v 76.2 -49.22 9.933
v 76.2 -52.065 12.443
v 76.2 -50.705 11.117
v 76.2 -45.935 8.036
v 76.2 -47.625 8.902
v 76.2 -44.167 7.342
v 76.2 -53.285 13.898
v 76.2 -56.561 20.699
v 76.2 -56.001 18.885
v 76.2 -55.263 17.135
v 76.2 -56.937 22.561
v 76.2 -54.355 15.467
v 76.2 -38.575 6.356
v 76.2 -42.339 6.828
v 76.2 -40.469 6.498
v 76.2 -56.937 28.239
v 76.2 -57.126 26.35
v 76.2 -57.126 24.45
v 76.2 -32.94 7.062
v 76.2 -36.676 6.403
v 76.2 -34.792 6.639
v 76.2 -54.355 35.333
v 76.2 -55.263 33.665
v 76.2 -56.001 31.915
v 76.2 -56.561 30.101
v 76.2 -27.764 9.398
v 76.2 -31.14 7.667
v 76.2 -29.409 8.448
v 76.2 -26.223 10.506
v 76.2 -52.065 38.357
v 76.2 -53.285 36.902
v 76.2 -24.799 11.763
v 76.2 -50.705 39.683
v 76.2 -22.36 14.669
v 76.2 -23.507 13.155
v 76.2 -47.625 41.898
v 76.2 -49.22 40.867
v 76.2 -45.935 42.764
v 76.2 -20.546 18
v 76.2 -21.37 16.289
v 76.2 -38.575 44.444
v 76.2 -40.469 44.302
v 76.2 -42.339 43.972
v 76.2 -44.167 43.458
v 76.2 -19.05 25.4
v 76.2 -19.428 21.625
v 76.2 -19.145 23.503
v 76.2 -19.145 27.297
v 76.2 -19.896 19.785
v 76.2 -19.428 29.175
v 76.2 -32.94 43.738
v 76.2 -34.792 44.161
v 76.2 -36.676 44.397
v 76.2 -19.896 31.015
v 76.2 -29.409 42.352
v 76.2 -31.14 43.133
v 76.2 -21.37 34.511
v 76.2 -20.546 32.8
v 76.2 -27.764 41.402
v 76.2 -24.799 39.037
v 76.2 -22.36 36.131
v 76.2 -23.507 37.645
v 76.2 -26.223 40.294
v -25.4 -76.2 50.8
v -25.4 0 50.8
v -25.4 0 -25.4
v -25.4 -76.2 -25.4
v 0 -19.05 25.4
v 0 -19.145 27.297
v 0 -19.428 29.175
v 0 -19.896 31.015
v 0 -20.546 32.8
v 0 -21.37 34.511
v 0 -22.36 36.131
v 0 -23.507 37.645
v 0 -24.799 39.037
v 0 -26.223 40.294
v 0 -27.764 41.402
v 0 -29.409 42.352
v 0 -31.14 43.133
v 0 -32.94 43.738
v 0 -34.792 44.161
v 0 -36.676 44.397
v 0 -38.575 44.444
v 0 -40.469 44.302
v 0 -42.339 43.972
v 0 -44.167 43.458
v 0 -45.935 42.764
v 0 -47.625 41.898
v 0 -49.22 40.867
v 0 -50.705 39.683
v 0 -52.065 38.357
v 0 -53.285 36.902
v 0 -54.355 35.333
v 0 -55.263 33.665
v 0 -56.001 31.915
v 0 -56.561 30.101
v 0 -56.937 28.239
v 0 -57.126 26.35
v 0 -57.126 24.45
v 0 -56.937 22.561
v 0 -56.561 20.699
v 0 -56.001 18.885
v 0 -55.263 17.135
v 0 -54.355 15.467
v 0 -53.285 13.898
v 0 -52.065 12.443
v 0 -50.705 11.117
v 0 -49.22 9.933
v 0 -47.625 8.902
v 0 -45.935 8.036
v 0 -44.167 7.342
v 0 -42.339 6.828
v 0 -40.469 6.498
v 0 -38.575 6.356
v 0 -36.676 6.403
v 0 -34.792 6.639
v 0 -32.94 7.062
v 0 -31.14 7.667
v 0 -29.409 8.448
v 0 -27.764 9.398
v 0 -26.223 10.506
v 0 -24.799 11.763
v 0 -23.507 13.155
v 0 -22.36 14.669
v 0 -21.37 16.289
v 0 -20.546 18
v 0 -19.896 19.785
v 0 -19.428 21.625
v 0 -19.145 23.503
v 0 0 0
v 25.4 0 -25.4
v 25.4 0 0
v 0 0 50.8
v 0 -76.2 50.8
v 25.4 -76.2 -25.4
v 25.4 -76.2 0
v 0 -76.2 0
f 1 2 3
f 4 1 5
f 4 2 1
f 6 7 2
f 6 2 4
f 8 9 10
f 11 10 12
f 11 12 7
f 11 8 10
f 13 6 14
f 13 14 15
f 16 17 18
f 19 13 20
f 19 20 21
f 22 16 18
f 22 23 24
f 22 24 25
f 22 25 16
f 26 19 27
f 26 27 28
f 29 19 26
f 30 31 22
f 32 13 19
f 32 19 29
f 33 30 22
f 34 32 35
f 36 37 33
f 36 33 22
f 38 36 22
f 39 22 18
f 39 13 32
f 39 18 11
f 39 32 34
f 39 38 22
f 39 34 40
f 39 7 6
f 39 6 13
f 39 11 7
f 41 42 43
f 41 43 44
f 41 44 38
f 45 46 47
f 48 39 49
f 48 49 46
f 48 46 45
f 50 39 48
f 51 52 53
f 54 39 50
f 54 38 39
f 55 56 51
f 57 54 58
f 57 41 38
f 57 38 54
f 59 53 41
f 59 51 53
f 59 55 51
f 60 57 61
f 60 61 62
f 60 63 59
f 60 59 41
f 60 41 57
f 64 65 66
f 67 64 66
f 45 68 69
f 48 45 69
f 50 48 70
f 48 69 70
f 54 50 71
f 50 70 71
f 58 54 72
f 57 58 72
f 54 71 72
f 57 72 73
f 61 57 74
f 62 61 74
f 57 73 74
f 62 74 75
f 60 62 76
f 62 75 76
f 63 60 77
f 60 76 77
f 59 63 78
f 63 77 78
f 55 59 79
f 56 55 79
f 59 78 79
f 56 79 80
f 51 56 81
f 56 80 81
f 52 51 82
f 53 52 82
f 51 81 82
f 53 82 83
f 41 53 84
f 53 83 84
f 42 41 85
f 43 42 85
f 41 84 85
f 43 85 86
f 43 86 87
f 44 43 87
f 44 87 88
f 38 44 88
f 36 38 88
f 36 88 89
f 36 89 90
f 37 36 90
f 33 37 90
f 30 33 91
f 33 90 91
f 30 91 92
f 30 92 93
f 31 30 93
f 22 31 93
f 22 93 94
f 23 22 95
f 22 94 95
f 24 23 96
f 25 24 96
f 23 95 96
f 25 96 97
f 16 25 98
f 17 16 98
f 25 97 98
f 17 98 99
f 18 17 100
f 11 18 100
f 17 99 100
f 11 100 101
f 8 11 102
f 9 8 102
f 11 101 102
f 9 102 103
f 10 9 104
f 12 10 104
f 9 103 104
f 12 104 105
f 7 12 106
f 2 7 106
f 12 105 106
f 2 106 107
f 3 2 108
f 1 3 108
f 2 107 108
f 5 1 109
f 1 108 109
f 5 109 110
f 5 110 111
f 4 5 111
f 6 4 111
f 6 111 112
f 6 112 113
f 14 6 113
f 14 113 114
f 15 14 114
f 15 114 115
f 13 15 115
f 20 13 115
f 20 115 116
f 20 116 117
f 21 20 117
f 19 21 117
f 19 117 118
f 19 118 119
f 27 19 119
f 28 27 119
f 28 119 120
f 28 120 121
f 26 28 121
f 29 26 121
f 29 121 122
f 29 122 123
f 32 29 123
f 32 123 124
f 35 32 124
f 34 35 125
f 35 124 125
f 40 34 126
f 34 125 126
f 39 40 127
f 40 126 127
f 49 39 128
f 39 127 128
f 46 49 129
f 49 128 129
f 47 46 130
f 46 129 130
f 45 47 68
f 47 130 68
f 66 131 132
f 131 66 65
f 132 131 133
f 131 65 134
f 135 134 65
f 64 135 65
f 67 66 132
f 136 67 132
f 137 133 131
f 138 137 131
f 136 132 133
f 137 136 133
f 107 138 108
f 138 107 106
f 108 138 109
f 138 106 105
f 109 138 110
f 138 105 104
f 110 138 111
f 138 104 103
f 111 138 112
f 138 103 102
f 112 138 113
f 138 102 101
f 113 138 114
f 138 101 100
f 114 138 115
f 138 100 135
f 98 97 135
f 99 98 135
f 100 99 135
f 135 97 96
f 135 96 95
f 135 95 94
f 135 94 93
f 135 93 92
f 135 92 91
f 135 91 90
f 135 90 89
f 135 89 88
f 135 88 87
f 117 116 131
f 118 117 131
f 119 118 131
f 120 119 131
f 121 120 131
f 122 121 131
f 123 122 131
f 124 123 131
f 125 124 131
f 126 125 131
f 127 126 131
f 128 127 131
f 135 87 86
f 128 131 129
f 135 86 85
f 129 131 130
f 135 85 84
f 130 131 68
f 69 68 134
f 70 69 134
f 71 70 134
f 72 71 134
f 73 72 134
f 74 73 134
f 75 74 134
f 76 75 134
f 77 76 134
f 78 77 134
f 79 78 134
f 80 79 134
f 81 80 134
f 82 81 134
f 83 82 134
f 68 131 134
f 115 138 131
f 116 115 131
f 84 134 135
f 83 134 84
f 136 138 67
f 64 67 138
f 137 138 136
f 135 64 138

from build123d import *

# Parameters (mm, degrees)
F1_DEPTH = 76.2
F2_R     = 19.05
F3_DEPTH = 76.2


with BuildPart() as f1:
    # F0 (on Front) → F1 (new body)
    with BuildSketch(Plane.XZ):
        Polygon((25.4, 0), (0, 0), (0, 50.8), (-25.4, 50.8), (-25.4, -25.4), (25.4, -25.4), align=None)
    extrude(amount=F1_DEPTH)

    # F2 (on face) → F3 (join)
    with BuildSketch(Plane.YZ):
        with Locations((-38.1, 25.4)):
            Circle(F2_R)
    extrude(amount=F3_DEPTH)


solid = f1.part
